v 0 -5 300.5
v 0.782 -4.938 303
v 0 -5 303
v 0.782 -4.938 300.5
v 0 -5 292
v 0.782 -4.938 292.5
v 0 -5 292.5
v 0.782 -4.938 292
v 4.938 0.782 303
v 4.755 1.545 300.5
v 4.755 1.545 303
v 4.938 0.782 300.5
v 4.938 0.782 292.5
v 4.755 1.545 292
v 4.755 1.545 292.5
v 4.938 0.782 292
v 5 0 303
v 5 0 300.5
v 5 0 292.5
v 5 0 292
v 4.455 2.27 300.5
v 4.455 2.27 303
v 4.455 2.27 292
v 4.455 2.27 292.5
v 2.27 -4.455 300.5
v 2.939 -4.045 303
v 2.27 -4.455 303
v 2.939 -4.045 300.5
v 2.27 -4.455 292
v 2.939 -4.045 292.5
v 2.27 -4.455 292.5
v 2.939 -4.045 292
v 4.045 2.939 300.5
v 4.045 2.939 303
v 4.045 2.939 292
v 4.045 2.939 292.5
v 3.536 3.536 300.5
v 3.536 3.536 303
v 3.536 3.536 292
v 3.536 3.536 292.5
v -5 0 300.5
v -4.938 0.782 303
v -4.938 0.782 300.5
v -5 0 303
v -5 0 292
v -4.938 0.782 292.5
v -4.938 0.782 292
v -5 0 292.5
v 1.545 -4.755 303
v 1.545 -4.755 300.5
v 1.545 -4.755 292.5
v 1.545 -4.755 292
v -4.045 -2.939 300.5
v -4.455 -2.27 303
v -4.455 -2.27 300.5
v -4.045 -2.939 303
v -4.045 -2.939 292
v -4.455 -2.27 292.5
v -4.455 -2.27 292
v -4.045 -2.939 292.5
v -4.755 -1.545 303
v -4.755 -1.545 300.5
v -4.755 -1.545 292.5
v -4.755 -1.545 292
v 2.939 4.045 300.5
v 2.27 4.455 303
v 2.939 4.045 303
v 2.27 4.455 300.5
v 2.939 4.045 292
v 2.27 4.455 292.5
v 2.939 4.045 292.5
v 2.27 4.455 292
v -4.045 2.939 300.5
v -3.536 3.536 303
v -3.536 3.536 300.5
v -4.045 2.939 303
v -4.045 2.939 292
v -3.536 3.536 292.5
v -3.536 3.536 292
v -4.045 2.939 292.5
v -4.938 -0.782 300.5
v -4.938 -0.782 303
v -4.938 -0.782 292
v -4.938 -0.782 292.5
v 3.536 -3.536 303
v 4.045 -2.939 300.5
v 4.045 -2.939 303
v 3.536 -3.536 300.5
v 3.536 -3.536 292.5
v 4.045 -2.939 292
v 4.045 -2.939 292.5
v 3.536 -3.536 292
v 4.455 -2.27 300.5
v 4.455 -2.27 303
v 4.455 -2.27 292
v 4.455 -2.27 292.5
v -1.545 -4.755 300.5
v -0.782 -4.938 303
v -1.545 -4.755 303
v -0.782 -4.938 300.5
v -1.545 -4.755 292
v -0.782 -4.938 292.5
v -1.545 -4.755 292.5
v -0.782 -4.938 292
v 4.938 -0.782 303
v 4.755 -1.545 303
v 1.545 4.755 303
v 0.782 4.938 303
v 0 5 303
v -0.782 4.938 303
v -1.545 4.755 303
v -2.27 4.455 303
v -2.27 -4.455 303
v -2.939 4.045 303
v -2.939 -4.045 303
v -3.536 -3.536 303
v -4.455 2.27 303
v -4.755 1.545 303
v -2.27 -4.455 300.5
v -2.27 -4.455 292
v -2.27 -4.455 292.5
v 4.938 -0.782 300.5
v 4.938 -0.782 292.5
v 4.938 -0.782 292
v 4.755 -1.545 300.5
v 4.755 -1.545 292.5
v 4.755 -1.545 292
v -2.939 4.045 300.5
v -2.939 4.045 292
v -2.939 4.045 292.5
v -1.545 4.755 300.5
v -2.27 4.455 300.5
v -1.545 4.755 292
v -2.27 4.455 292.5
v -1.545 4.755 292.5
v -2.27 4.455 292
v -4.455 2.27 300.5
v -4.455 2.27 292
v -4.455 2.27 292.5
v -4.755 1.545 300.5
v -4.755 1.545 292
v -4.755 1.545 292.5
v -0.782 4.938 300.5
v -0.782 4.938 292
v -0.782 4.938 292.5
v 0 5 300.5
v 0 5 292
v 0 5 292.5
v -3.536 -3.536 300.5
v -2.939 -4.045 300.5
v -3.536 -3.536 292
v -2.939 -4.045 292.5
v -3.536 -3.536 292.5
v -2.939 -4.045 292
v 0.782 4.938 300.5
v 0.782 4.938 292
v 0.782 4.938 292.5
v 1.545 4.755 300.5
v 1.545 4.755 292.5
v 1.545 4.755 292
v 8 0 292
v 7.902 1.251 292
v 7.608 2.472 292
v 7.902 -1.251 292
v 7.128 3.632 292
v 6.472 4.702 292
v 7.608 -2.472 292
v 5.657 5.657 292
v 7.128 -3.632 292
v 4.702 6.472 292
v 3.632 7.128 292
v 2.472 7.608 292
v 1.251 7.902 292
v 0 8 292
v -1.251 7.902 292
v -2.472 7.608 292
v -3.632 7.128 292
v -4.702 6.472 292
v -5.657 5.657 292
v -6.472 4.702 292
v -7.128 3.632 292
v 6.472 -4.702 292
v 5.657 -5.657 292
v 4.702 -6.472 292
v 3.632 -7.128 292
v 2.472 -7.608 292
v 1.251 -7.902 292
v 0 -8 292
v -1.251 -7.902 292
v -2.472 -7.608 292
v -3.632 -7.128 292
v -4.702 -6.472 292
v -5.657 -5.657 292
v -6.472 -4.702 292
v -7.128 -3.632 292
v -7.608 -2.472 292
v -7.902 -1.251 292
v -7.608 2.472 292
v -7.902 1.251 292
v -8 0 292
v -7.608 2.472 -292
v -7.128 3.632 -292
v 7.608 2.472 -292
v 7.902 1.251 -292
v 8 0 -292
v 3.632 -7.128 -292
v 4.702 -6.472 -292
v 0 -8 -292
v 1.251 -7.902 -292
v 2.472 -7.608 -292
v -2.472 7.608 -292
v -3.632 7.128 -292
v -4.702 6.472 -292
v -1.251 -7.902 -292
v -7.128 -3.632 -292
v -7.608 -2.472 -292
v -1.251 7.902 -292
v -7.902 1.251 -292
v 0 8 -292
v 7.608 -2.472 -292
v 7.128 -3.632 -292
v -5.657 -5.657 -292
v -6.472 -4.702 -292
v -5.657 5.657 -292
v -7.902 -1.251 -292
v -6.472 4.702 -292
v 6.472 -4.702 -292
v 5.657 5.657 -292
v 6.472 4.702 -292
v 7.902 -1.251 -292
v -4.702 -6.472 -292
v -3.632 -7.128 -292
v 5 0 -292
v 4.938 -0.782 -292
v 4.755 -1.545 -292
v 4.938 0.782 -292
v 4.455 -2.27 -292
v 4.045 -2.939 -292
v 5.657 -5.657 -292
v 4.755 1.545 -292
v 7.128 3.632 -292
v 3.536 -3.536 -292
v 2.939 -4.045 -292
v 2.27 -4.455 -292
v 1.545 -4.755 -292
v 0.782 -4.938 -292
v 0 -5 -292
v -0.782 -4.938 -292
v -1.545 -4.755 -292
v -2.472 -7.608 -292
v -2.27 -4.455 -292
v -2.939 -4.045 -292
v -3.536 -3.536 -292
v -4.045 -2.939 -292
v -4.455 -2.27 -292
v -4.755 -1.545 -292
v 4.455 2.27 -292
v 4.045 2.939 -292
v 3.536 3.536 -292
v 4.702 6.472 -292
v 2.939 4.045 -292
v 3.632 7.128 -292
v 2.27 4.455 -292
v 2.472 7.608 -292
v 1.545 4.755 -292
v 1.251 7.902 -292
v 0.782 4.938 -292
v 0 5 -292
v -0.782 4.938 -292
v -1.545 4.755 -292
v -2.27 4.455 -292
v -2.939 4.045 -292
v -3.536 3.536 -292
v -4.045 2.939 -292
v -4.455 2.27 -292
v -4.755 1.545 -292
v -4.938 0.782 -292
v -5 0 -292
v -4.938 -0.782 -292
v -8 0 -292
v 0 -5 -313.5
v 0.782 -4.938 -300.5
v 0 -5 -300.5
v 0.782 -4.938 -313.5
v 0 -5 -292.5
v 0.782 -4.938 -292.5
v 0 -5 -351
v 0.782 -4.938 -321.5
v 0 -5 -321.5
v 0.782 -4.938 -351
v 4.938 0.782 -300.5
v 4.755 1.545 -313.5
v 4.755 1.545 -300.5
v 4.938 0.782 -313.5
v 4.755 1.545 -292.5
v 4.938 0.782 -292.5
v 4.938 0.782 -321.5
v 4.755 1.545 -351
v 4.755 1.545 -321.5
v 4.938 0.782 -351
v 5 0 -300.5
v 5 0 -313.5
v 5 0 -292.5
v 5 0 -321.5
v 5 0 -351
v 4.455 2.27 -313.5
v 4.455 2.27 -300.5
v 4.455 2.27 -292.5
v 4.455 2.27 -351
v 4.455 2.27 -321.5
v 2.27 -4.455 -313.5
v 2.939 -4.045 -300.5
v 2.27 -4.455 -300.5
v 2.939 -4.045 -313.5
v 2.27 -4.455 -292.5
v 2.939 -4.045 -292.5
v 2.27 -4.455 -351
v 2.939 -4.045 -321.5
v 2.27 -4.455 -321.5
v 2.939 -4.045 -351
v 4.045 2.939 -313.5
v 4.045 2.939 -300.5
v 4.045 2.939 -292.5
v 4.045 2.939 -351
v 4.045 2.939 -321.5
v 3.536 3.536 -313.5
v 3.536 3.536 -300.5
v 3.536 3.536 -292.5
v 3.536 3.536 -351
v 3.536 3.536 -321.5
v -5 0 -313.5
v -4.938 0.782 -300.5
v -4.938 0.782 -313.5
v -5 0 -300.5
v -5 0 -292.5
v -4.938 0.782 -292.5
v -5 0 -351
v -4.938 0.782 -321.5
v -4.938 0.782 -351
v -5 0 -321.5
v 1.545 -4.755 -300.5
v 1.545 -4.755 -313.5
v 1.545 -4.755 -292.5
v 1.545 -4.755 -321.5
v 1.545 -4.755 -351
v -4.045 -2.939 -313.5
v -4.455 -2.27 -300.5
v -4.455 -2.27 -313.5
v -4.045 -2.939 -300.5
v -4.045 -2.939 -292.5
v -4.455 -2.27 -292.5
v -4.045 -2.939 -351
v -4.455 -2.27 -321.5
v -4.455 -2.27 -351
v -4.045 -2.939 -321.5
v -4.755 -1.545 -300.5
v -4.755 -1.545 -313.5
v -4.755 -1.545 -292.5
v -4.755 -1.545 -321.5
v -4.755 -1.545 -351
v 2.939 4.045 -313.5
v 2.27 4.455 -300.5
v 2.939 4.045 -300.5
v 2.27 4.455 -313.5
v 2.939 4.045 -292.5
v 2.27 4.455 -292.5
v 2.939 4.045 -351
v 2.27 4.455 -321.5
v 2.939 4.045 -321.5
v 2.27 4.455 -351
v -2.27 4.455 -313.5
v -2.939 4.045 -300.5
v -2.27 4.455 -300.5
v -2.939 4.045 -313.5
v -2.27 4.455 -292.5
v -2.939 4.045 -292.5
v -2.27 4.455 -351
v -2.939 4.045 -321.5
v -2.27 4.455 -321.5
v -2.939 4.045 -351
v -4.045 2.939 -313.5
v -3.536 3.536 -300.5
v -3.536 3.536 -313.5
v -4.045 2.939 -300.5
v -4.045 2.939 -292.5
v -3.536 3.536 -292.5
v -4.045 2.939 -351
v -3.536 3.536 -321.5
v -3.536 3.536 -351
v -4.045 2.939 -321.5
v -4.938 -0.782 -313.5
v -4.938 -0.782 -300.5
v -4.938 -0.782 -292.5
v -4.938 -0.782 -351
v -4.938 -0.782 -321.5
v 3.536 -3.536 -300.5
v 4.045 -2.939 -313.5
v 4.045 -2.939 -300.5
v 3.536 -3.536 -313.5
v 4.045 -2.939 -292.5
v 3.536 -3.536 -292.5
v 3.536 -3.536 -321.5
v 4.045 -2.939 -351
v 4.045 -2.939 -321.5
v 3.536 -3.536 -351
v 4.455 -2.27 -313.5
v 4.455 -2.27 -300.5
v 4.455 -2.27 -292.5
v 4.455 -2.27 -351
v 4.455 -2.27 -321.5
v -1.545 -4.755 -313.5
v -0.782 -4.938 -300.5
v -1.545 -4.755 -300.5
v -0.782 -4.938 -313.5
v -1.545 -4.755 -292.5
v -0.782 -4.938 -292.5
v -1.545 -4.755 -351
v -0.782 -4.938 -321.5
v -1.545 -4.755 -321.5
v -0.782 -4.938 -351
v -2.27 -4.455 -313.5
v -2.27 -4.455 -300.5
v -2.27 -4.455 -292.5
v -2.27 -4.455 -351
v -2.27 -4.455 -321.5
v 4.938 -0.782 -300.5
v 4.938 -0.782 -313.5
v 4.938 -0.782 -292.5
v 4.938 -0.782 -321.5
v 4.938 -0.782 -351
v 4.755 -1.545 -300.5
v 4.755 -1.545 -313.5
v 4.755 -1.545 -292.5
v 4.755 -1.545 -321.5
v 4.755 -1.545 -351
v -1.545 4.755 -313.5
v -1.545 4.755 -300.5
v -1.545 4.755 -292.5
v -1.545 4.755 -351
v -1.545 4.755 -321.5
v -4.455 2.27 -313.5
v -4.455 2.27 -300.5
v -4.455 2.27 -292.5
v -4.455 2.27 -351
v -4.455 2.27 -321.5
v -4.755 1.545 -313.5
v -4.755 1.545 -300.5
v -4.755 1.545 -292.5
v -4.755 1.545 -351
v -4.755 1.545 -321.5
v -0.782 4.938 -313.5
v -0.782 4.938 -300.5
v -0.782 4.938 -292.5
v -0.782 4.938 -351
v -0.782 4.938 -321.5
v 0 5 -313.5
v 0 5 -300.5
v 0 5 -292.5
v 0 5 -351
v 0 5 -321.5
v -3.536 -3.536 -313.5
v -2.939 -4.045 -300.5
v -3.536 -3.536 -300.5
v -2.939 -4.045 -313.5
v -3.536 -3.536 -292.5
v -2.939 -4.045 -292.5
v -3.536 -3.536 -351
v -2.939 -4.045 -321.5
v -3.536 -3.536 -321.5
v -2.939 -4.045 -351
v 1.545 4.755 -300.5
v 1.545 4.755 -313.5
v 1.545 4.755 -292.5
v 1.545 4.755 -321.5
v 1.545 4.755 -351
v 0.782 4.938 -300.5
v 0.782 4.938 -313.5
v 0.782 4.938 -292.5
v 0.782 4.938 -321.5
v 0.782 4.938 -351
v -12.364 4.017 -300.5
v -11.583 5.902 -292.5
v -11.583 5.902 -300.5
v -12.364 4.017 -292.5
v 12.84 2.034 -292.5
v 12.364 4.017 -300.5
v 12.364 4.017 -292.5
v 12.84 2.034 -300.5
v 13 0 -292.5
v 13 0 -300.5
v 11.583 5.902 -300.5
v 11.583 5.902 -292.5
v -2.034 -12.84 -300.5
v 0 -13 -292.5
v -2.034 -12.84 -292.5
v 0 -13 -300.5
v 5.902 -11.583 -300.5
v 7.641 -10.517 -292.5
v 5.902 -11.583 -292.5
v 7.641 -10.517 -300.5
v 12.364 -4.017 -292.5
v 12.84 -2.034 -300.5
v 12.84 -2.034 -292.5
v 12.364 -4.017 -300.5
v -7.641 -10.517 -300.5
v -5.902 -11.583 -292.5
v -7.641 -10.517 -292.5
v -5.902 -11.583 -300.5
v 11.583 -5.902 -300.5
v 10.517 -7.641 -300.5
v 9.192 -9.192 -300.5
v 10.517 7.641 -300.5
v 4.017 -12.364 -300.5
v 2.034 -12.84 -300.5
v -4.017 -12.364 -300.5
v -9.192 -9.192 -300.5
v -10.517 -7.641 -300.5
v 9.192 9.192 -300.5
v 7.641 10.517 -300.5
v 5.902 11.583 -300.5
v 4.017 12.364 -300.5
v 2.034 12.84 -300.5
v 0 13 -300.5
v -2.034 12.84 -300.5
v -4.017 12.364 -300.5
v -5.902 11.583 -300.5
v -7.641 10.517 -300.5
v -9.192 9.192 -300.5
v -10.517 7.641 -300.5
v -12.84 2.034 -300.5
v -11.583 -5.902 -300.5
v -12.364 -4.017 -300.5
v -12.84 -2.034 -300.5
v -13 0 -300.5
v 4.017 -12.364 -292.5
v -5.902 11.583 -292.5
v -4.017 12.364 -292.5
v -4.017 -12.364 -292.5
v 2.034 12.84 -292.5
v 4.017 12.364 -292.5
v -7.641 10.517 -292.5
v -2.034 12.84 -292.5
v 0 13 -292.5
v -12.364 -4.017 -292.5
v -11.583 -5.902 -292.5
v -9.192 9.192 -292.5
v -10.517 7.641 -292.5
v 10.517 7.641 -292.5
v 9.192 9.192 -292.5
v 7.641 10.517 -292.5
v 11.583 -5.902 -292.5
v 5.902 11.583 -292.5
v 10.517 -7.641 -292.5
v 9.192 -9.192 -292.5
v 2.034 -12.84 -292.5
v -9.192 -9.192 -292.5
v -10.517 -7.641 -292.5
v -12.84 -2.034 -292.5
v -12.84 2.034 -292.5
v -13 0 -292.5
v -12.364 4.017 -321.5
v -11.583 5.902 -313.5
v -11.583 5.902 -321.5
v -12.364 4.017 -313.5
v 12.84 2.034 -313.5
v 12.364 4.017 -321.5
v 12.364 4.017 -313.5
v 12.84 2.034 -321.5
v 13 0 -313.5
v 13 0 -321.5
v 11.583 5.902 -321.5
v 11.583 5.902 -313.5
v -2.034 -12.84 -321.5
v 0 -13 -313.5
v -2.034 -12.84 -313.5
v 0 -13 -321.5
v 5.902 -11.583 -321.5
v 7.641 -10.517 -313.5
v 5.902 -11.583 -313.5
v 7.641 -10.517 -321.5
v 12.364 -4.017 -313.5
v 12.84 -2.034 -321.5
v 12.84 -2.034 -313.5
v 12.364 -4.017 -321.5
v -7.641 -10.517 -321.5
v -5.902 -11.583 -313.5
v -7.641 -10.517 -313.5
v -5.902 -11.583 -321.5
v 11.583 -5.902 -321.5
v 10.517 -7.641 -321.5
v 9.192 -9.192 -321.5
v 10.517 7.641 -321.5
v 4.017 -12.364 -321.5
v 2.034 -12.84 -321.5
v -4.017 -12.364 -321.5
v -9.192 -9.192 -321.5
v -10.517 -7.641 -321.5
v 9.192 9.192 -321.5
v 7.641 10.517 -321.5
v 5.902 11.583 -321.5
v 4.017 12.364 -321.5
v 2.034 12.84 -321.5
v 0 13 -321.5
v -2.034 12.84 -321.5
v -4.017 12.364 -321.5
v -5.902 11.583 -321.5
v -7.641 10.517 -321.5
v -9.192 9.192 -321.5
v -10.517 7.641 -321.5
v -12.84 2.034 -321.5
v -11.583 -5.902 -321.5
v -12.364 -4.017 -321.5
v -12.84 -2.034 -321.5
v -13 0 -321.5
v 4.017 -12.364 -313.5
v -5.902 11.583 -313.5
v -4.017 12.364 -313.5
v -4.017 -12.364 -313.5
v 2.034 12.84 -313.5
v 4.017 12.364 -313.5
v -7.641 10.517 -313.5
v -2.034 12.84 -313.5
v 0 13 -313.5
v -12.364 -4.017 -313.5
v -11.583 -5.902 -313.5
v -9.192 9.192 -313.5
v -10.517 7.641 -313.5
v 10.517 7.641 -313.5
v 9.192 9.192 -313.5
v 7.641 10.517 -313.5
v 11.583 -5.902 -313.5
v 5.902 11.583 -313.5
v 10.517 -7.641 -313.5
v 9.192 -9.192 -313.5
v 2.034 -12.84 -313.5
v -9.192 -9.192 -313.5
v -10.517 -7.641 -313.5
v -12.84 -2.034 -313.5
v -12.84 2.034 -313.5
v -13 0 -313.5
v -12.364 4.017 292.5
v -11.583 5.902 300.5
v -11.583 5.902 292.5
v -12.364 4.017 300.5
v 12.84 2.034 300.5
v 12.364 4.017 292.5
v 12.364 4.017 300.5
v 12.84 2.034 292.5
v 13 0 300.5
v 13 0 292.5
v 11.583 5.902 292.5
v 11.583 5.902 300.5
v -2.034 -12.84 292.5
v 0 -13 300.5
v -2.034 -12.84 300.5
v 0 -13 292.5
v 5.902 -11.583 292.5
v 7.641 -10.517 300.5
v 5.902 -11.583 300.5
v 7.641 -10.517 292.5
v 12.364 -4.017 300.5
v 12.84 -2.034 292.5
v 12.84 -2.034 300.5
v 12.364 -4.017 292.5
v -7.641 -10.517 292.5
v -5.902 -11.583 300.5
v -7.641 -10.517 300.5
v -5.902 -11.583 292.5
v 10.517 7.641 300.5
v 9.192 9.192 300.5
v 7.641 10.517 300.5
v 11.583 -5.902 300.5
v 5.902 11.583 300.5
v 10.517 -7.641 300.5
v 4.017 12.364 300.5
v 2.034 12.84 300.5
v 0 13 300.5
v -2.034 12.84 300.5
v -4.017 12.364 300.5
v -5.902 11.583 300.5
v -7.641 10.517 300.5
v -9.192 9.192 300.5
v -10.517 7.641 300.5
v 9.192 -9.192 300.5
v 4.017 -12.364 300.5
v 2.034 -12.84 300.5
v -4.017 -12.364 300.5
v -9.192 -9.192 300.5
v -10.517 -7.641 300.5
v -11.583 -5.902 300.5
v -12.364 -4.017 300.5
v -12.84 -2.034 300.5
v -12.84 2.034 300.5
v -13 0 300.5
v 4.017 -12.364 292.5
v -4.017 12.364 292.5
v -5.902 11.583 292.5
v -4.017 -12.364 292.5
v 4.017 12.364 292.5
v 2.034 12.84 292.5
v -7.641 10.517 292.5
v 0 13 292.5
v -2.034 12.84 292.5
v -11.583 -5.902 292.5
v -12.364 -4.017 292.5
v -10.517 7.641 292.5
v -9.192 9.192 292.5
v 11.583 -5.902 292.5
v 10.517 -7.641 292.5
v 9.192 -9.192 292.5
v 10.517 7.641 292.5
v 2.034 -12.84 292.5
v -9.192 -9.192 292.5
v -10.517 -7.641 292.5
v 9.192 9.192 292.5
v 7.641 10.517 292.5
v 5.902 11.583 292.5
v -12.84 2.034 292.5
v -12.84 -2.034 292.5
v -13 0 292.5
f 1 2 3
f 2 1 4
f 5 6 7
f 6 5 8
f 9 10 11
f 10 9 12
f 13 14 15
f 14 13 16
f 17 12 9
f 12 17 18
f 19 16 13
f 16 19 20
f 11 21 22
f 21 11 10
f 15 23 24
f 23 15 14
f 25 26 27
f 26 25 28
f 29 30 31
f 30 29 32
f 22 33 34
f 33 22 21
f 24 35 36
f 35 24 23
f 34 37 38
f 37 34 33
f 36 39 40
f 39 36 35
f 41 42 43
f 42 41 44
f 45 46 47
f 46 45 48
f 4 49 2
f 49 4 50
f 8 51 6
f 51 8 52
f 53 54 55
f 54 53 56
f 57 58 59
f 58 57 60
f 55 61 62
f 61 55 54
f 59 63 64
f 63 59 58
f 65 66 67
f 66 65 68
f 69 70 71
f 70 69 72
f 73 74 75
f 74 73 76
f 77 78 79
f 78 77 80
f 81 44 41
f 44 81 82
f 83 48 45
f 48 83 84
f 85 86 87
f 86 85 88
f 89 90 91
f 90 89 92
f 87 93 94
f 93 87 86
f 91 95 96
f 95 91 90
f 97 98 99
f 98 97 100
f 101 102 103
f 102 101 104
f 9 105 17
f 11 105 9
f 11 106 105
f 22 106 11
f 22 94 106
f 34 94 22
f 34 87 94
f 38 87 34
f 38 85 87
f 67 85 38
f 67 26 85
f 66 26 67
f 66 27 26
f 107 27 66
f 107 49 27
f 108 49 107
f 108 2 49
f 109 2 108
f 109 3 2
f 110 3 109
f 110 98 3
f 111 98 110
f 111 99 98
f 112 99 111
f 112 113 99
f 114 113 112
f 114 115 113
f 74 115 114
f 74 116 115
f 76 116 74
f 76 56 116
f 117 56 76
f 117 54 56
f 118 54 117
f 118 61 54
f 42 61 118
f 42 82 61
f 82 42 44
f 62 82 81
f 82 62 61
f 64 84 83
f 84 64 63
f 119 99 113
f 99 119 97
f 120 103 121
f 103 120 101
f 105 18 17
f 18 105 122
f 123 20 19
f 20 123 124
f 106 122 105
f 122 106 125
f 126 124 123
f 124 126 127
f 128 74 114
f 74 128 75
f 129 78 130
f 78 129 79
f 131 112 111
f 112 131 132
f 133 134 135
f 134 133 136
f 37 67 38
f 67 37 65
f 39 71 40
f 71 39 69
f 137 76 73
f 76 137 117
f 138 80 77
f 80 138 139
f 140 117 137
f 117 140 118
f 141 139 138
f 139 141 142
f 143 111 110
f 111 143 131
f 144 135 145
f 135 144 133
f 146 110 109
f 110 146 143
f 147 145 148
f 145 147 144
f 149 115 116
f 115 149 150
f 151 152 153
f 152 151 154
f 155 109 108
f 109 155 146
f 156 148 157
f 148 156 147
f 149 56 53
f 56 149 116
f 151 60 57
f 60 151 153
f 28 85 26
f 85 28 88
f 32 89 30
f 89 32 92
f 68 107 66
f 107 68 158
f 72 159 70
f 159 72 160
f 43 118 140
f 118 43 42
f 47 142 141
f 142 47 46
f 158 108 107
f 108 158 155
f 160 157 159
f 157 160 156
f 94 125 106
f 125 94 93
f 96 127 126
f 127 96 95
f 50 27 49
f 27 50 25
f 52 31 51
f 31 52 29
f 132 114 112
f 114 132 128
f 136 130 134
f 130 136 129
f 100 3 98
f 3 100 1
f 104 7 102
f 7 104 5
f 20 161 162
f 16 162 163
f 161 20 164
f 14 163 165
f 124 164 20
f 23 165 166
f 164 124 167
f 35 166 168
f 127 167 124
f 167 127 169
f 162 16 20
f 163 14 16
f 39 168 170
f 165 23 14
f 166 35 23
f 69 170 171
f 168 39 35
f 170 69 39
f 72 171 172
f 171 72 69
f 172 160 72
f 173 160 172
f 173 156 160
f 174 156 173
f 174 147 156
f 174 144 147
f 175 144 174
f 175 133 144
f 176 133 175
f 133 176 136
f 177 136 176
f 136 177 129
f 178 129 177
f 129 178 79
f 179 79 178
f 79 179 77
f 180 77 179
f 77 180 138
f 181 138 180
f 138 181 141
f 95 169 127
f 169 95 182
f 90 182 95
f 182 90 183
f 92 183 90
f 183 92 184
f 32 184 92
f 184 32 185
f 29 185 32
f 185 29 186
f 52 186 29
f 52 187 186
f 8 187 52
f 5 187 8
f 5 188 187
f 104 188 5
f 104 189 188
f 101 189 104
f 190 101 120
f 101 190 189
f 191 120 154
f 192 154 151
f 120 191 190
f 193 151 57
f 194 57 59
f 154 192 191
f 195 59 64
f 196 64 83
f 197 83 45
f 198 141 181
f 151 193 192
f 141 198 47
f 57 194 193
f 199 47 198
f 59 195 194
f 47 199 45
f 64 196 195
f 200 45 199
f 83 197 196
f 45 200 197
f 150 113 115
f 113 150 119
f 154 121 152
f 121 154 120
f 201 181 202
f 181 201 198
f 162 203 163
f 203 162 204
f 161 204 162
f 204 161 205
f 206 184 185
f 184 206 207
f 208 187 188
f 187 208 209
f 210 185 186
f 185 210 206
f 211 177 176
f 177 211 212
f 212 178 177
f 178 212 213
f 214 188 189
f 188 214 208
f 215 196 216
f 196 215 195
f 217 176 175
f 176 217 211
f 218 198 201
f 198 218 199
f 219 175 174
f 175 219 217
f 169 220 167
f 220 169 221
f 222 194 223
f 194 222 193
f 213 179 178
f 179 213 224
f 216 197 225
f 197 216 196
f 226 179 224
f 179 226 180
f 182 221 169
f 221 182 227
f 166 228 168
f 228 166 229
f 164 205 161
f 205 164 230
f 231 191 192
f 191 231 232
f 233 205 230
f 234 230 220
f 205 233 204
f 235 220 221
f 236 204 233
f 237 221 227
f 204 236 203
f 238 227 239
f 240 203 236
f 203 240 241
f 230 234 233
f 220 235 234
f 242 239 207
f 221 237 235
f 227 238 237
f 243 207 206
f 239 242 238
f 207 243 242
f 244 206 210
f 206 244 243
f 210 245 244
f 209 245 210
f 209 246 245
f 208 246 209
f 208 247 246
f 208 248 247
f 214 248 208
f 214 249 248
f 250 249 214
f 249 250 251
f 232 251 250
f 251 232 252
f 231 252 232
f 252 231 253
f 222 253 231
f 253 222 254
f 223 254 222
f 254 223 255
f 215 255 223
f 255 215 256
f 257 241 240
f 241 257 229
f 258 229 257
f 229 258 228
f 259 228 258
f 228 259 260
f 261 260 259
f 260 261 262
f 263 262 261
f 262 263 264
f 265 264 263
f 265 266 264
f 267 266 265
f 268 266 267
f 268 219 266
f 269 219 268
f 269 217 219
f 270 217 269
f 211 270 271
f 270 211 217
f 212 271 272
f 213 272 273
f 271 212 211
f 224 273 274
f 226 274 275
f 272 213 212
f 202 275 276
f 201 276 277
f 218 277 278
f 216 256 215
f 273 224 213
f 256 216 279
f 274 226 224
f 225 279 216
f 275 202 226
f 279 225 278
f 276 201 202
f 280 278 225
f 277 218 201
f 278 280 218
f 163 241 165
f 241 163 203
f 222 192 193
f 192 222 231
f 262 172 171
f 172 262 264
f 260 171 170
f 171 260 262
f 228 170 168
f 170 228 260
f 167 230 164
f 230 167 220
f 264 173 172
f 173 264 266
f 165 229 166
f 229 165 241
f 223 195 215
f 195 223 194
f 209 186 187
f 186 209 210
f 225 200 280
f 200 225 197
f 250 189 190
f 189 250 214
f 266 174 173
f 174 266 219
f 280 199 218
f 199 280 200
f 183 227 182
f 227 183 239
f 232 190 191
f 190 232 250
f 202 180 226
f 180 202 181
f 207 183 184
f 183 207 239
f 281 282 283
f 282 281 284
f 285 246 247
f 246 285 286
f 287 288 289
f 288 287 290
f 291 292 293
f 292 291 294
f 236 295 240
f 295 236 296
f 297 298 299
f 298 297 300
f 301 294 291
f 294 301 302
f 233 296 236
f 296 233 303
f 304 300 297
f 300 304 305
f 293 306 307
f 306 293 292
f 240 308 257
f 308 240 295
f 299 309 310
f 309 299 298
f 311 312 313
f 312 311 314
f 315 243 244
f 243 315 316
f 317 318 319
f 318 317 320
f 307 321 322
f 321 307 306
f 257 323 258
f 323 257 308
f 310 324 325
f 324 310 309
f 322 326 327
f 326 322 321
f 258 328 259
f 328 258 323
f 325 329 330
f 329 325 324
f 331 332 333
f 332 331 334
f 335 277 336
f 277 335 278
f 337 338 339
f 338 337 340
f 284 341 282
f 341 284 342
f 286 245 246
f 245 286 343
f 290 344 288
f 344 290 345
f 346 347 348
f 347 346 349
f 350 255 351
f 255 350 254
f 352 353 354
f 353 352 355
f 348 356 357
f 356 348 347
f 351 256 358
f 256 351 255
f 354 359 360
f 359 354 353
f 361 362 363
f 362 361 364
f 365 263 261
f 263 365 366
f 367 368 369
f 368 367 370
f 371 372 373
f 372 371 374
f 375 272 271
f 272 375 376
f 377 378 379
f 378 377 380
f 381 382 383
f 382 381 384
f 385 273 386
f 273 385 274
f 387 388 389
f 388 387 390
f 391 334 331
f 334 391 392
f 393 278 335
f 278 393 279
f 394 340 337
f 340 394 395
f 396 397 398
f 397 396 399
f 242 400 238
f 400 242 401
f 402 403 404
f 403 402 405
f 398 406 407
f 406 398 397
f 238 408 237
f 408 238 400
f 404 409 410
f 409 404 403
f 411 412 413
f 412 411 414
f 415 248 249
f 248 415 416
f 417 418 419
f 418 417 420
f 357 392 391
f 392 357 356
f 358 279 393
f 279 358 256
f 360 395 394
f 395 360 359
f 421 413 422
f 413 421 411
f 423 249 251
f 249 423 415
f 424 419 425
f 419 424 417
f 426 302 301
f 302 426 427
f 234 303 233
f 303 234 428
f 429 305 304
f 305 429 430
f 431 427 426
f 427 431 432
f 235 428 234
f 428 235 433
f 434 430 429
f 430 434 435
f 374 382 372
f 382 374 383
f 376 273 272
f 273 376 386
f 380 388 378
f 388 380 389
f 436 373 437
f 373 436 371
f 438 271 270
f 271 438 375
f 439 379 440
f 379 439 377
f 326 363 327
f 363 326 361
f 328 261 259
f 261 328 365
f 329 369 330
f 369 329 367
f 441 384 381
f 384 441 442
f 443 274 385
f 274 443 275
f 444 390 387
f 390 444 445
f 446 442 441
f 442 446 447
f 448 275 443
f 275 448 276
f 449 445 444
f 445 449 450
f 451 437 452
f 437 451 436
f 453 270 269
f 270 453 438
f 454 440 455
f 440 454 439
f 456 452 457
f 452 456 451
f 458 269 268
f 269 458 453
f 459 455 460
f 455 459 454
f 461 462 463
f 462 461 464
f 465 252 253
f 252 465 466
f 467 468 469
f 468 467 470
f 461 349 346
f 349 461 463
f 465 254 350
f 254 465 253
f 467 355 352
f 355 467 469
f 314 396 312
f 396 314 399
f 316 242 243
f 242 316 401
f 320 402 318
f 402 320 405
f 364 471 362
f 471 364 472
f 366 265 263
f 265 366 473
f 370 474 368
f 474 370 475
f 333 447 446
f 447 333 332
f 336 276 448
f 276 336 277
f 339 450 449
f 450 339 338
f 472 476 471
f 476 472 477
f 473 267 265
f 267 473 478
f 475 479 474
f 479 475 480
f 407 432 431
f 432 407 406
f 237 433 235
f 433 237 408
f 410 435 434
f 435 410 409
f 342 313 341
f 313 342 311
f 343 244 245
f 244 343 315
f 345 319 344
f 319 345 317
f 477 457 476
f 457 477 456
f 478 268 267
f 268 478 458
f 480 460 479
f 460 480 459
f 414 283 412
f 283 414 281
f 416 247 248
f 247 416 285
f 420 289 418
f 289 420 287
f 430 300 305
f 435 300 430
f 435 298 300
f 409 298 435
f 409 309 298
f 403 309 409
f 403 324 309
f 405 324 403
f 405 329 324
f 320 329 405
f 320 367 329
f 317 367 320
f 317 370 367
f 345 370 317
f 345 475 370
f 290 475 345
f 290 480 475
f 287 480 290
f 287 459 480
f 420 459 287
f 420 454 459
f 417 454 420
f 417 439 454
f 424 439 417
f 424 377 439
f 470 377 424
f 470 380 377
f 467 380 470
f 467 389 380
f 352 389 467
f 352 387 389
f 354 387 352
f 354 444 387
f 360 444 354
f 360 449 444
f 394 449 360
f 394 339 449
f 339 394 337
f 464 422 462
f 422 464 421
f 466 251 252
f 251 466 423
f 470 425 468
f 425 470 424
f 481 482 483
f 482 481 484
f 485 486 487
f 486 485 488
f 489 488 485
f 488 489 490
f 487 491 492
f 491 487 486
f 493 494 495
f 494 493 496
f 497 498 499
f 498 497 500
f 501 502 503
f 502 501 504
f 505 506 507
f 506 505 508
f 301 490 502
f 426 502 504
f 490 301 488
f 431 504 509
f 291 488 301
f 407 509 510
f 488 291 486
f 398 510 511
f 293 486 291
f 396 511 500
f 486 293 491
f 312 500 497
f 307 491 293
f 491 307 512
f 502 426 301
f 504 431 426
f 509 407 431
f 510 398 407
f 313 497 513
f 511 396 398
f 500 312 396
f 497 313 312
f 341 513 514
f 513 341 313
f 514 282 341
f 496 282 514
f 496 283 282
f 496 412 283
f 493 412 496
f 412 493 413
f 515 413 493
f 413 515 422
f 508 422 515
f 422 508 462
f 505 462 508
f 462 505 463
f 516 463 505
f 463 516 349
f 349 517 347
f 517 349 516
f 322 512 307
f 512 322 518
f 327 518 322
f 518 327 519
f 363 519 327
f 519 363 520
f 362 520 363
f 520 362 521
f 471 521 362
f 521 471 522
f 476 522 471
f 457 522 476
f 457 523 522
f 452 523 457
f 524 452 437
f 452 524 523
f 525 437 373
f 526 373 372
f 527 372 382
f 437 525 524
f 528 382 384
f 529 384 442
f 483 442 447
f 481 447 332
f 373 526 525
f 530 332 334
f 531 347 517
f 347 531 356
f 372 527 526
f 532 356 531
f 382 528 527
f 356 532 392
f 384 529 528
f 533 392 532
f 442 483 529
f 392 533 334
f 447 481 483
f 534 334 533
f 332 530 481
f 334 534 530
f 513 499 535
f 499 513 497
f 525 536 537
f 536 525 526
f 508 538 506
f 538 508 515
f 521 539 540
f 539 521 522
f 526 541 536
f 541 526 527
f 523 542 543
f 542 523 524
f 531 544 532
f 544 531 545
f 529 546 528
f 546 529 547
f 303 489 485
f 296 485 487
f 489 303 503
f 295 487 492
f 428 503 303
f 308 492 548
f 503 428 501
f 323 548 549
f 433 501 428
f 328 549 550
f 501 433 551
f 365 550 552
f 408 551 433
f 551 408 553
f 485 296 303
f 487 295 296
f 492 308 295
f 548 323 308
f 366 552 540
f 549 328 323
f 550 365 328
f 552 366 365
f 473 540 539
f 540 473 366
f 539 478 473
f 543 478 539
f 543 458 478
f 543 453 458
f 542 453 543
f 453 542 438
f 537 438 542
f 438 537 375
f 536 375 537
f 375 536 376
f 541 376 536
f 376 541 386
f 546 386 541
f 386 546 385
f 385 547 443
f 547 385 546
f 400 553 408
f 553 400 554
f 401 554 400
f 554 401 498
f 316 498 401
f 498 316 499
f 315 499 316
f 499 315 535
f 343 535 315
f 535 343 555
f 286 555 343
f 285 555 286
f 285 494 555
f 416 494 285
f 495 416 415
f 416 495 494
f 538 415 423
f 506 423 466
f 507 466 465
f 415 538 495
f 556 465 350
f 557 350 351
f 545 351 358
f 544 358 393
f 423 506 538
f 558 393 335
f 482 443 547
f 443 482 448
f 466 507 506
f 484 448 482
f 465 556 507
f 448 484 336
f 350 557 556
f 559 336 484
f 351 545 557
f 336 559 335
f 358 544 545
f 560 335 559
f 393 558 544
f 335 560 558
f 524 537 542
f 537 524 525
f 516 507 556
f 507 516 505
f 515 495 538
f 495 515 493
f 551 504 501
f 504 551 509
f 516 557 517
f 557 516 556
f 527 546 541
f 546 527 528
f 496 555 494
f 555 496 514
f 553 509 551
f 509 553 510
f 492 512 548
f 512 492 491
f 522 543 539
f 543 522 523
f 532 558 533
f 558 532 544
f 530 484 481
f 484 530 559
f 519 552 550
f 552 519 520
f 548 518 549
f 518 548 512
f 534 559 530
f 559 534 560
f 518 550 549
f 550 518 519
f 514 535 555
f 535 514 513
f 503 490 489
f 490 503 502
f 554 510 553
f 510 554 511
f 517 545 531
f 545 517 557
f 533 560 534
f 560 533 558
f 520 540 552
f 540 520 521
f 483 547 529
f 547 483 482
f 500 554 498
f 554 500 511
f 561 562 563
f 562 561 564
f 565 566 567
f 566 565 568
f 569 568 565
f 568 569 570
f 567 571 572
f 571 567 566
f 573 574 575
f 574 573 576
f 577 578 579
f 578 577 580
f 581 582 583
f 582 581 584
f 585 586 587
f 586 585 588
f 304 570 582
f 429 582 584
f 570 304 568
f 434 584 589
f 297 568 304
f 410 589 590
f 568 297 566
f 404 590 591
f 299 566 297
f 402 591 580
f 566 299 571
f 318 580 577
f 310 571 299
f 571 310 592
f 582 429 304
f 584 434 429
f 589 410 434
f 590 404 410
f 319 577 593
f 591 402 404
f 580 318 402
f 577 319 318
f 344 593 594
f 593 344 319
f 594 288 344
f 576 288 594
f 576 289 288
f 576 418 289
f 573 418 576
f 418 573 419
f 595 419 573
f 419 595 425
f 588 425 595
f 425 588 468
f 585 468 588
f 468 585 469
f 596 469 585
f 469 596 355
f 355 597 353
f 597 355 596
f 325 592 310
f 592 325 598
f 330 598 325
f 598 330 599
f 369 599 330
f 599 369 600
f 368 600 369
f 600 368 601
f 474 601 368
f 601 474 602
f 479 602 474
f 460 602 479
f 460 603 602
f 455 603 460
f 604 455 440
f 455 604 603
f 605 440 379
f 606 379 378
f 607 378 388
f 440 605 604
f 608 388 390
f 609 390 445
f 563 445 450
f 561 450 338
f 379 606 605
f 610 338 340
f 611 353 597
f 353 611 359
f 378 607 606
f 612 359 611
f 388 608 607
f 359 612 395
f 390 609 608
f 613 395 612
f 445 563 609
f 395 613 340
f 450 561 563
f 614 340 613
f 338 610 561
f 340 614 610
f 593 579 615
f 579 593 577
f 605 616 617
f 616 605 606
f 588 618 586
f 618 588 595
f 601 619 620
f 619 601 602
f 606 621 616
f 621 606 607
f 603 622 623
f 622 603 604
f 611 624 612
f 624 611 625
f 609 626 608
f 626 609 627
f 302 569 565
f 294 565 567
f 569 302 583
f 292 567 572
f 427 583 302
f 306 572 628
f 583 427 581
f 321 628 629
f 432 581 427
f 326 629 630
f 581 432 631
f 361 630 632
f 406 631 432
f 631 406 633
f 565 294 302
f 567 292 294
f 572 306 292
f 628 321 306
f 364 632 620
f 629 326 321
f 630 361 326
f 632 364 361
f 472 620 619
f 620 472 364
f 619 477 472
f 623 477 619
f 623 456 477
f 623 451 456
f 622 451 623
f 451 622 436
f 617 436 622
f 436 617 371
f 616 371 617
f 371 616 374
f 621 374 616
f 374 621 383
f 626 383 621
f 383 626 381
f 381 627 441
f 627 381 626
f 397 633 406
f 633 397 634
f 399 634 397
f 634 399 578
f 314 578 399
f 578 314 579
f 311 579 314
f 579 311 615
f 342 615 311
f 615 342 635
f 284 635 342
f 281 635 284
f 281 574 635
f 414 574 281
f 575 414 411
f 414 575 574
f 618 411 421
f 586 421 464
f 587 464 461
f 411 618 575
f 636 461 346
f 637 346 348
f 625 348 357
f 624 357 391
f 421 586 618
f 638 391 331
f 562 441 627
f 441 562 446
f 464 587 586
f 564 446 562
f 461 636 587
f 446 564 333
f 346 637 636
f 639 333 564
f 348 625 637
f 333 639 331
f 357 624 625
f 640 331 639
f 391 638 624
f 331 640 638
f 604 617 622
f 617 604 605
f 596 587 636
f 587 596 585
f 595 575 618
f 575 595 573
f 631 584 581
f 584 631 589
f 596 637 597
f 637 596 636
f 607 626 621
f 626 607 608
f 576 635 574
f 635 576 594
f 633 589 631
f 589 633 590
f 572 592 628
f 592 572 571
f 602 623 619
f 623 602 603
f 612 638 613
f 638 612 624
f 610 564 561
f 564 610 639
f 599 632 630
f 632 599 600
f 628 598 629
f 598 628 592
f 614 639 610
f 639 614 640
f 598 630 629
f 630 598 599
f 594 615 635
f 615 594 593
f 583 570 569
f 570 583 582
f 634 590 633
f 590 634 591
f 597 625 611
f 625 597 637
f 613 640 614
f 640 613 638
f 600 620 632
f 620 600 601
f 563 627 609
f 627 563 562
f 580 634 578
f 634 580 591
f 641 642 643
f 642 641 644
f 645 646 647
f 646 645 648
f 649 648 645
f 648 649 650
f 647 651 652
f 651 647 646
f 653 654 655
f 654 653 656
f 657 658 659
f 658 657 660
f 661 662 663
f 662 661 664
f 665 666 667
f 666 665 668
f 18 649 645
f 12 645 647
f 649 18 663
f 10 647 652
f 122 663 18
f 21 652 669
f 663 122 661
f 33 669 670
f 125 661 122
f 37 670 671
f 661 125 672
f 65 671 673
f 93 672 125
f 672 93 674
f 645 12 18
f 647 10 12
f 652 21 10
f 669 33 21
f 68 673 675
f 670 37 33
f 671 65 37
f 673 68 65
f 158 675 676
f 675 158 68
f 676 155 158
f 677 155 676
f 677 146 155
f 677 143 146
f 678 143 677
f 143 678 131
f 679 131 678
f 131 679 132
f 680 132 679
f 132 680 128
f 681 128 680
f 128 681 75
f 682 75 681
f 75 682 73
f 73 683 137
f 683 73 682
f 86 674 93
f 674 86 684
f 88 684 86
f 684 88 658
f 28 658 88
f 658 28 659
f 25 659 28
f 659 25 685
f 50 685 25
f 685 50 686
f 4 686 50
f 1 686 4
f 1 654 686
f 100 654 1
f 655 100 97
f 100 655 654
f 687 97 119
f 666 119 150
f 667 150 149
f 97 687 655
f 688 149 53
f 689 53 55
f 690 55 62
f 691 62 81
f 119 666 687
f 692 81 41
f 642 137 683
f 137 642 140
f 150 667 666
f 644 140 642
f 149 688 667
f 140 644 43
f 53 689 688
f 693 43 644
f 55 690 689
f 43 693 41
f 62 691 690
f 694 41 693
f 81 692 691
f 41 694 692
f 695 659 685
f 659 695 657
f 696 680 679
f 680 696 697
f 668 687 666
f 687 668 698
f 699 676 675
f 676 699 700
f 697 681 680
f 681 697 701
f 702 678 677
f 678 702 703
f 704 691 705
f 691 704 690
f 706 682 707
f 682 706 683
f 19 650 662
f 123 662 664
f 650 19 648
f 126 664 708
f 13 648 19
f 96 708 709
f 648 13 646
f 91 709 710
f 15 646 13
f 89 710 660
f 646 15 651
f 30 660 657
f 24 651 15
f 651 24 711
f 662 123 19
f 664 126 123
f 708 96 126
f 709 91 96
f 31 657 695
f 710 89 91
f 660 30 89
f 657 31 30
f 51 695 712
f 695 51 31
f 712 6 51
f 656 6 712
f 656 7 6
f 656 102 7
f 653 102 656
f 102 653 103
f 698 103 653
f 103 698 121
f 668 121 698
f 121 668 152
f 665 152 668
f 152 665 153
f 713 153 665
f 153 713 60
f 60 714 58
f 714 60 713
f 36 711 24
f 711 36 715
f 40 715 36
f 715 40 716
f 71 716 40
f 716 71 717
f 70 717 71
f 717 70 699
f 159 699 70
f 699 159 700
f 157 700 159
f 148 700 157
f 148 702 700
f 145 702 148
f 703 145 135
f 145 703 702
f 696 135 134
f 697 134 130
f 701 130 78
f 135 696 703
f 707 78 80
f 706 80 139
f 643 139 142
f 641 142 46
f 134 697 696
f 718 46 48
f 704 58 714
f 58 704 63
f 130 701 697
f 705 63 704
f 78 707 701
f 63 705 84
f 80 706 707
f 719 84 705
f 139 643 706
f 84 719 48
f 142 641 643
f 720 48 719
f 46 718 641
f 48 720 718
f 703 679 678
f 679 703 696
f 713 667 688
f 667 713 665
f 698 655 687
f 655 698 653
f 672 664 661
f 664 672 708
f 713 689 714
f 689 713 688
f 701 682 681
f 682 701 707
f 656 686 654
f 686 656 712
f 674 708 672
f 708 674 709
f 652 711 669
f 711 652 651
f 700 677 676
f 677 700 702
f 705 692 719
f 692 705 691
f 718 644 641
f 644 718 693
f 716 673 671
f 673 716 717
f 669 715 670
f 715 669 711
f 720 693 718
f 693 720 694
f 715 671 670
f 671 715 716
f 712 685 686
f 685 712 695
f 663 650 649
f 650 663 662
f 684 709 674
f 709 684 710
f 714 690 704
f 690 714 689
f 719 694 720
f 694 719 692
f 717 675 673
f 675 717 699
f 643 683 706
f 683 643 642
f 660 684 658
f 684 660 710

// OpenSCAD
// file: bf12.scad
module bearing6000zz(){
	color([0.8,0.8,0.8])difference(){
		cylinder(h=8, r=13, center=true, $fn=40);
		cylinder(h=9, r=5, center=true, $fn=40);	
	}
}


module bf12() {
	color([0.2,0.2,0.2])difference(){
		linear_extrude(height = 20, center = true, convexity = 10, $fn=40)
	   		import (file = "bf12.dxf", layer = "0");
	   	translate([23,-5,0])rotate([90,0,0])cylinder(h=50, r=3.3, center=true, $fn=40);
	   	translate([-23,-5,0])rotate([90,0,0])cylinder(h=50, r=3.3, center=true, $fn=40);
	   	translate([-23,5.6,0])rotate([90,0,0])cylinder(h=4, r=10.8/2, center=true, $fn=40);	
	   	translate([23,5.6,0])rotate([90,0,0])cylinder(h=4, r=10.8/2, center=true, $fn=40);
	}
	translate([0,0,5.5])bearing6000zz();
}

bf12();
// file: bk12.scad
module bearing6000zz(){
	color([0.8,0.8,0.8])difference(){
		cylinder(h=8, r=13, center=true, $fn=40);
		cylinder(h=9, r=5, center=true, $fn=40);	
	}
}


module bk12() {
	color([0.2,0.2,0.2])difference(){
		union(){
			linear_extrude(height = 25, center = true, convexity = 10, $fn=40)
		   		import (file = "bk12.dxf", layer = "0");
			translate([0,0,15])linear_extrude(height = 5, center = true, convexity = 10, $fn=40)
		   		import (file = "bk12.dxf", layer = "bearing_plate");
		}
	   	translate([23,-5,-6.5])rotate([90,0,0])cylinder(h=50, r=3.3, center=true, $fn=40);
	   	translate([-23,-5,-6.5])rotate([90,0,0])cylinder(h=50, r=3.3, center=true, $fn=40);
	   	translate([-23,5.6,-6.5])rotate([90,0,0])cylinder(h=4, r=10.8/2, center=true, $fn=40);
	   	translate([23,5.6,-6.5])rotate([90,0,0])cylinder(h=4, r=10.8/2, center=true, $fn=40);
	   	translate([23,-5,6.5])rotate([90,0,0])cylinder(h=50, r=3.3, center=true, $fn=40);
	   	translate([-23,-5,6.5])rotate([90,0,0])cylinder(h=50, r=3.3, center=true, $fn=40);
	   	translate([-23,5.6,6.5])rotate([90,0,0])cylinder(h=4, r=10.8/2, center=true, $fn=40);	
	   	translate([23,5.6,6.5])rotate([90,0,0])cylinder(h=4, r=10.8/2, center=true, $fn=40);
	}
	translate([0,0,13])bearing6000zz();
	translate([0,0,-8])bearing6000zz();

}

bk12();
// main file
use <bk12.scad>;
use <bf12.scad>;

module leadscrew600mm(){
	color([0.85,0.85,0.85])union(){
		translate([0,0,297.5])cylinder(h=11, r=5, center=true, $fn=40);
		translate()cylinder(h=584, r=8, center=true, $fn=40);
		translate([0,0,-321.5])cylinder(h=59, r=5, center=true, $fn=40);	
	}
	translate([0,0,-309.5])bk12();
	translate([0,0,302])mirror([0,0,1])bf12();
}


leadscrew600mm();

// translate([0,0,-117.5]){
// 	translate([0,0,235])rotate([90,0,0])cylinder(r=4, h=50, center=true);
// 	translate([0,0,0])rotate([90,0,0])cylinder(r=4, h=50, center=true);	
// }
